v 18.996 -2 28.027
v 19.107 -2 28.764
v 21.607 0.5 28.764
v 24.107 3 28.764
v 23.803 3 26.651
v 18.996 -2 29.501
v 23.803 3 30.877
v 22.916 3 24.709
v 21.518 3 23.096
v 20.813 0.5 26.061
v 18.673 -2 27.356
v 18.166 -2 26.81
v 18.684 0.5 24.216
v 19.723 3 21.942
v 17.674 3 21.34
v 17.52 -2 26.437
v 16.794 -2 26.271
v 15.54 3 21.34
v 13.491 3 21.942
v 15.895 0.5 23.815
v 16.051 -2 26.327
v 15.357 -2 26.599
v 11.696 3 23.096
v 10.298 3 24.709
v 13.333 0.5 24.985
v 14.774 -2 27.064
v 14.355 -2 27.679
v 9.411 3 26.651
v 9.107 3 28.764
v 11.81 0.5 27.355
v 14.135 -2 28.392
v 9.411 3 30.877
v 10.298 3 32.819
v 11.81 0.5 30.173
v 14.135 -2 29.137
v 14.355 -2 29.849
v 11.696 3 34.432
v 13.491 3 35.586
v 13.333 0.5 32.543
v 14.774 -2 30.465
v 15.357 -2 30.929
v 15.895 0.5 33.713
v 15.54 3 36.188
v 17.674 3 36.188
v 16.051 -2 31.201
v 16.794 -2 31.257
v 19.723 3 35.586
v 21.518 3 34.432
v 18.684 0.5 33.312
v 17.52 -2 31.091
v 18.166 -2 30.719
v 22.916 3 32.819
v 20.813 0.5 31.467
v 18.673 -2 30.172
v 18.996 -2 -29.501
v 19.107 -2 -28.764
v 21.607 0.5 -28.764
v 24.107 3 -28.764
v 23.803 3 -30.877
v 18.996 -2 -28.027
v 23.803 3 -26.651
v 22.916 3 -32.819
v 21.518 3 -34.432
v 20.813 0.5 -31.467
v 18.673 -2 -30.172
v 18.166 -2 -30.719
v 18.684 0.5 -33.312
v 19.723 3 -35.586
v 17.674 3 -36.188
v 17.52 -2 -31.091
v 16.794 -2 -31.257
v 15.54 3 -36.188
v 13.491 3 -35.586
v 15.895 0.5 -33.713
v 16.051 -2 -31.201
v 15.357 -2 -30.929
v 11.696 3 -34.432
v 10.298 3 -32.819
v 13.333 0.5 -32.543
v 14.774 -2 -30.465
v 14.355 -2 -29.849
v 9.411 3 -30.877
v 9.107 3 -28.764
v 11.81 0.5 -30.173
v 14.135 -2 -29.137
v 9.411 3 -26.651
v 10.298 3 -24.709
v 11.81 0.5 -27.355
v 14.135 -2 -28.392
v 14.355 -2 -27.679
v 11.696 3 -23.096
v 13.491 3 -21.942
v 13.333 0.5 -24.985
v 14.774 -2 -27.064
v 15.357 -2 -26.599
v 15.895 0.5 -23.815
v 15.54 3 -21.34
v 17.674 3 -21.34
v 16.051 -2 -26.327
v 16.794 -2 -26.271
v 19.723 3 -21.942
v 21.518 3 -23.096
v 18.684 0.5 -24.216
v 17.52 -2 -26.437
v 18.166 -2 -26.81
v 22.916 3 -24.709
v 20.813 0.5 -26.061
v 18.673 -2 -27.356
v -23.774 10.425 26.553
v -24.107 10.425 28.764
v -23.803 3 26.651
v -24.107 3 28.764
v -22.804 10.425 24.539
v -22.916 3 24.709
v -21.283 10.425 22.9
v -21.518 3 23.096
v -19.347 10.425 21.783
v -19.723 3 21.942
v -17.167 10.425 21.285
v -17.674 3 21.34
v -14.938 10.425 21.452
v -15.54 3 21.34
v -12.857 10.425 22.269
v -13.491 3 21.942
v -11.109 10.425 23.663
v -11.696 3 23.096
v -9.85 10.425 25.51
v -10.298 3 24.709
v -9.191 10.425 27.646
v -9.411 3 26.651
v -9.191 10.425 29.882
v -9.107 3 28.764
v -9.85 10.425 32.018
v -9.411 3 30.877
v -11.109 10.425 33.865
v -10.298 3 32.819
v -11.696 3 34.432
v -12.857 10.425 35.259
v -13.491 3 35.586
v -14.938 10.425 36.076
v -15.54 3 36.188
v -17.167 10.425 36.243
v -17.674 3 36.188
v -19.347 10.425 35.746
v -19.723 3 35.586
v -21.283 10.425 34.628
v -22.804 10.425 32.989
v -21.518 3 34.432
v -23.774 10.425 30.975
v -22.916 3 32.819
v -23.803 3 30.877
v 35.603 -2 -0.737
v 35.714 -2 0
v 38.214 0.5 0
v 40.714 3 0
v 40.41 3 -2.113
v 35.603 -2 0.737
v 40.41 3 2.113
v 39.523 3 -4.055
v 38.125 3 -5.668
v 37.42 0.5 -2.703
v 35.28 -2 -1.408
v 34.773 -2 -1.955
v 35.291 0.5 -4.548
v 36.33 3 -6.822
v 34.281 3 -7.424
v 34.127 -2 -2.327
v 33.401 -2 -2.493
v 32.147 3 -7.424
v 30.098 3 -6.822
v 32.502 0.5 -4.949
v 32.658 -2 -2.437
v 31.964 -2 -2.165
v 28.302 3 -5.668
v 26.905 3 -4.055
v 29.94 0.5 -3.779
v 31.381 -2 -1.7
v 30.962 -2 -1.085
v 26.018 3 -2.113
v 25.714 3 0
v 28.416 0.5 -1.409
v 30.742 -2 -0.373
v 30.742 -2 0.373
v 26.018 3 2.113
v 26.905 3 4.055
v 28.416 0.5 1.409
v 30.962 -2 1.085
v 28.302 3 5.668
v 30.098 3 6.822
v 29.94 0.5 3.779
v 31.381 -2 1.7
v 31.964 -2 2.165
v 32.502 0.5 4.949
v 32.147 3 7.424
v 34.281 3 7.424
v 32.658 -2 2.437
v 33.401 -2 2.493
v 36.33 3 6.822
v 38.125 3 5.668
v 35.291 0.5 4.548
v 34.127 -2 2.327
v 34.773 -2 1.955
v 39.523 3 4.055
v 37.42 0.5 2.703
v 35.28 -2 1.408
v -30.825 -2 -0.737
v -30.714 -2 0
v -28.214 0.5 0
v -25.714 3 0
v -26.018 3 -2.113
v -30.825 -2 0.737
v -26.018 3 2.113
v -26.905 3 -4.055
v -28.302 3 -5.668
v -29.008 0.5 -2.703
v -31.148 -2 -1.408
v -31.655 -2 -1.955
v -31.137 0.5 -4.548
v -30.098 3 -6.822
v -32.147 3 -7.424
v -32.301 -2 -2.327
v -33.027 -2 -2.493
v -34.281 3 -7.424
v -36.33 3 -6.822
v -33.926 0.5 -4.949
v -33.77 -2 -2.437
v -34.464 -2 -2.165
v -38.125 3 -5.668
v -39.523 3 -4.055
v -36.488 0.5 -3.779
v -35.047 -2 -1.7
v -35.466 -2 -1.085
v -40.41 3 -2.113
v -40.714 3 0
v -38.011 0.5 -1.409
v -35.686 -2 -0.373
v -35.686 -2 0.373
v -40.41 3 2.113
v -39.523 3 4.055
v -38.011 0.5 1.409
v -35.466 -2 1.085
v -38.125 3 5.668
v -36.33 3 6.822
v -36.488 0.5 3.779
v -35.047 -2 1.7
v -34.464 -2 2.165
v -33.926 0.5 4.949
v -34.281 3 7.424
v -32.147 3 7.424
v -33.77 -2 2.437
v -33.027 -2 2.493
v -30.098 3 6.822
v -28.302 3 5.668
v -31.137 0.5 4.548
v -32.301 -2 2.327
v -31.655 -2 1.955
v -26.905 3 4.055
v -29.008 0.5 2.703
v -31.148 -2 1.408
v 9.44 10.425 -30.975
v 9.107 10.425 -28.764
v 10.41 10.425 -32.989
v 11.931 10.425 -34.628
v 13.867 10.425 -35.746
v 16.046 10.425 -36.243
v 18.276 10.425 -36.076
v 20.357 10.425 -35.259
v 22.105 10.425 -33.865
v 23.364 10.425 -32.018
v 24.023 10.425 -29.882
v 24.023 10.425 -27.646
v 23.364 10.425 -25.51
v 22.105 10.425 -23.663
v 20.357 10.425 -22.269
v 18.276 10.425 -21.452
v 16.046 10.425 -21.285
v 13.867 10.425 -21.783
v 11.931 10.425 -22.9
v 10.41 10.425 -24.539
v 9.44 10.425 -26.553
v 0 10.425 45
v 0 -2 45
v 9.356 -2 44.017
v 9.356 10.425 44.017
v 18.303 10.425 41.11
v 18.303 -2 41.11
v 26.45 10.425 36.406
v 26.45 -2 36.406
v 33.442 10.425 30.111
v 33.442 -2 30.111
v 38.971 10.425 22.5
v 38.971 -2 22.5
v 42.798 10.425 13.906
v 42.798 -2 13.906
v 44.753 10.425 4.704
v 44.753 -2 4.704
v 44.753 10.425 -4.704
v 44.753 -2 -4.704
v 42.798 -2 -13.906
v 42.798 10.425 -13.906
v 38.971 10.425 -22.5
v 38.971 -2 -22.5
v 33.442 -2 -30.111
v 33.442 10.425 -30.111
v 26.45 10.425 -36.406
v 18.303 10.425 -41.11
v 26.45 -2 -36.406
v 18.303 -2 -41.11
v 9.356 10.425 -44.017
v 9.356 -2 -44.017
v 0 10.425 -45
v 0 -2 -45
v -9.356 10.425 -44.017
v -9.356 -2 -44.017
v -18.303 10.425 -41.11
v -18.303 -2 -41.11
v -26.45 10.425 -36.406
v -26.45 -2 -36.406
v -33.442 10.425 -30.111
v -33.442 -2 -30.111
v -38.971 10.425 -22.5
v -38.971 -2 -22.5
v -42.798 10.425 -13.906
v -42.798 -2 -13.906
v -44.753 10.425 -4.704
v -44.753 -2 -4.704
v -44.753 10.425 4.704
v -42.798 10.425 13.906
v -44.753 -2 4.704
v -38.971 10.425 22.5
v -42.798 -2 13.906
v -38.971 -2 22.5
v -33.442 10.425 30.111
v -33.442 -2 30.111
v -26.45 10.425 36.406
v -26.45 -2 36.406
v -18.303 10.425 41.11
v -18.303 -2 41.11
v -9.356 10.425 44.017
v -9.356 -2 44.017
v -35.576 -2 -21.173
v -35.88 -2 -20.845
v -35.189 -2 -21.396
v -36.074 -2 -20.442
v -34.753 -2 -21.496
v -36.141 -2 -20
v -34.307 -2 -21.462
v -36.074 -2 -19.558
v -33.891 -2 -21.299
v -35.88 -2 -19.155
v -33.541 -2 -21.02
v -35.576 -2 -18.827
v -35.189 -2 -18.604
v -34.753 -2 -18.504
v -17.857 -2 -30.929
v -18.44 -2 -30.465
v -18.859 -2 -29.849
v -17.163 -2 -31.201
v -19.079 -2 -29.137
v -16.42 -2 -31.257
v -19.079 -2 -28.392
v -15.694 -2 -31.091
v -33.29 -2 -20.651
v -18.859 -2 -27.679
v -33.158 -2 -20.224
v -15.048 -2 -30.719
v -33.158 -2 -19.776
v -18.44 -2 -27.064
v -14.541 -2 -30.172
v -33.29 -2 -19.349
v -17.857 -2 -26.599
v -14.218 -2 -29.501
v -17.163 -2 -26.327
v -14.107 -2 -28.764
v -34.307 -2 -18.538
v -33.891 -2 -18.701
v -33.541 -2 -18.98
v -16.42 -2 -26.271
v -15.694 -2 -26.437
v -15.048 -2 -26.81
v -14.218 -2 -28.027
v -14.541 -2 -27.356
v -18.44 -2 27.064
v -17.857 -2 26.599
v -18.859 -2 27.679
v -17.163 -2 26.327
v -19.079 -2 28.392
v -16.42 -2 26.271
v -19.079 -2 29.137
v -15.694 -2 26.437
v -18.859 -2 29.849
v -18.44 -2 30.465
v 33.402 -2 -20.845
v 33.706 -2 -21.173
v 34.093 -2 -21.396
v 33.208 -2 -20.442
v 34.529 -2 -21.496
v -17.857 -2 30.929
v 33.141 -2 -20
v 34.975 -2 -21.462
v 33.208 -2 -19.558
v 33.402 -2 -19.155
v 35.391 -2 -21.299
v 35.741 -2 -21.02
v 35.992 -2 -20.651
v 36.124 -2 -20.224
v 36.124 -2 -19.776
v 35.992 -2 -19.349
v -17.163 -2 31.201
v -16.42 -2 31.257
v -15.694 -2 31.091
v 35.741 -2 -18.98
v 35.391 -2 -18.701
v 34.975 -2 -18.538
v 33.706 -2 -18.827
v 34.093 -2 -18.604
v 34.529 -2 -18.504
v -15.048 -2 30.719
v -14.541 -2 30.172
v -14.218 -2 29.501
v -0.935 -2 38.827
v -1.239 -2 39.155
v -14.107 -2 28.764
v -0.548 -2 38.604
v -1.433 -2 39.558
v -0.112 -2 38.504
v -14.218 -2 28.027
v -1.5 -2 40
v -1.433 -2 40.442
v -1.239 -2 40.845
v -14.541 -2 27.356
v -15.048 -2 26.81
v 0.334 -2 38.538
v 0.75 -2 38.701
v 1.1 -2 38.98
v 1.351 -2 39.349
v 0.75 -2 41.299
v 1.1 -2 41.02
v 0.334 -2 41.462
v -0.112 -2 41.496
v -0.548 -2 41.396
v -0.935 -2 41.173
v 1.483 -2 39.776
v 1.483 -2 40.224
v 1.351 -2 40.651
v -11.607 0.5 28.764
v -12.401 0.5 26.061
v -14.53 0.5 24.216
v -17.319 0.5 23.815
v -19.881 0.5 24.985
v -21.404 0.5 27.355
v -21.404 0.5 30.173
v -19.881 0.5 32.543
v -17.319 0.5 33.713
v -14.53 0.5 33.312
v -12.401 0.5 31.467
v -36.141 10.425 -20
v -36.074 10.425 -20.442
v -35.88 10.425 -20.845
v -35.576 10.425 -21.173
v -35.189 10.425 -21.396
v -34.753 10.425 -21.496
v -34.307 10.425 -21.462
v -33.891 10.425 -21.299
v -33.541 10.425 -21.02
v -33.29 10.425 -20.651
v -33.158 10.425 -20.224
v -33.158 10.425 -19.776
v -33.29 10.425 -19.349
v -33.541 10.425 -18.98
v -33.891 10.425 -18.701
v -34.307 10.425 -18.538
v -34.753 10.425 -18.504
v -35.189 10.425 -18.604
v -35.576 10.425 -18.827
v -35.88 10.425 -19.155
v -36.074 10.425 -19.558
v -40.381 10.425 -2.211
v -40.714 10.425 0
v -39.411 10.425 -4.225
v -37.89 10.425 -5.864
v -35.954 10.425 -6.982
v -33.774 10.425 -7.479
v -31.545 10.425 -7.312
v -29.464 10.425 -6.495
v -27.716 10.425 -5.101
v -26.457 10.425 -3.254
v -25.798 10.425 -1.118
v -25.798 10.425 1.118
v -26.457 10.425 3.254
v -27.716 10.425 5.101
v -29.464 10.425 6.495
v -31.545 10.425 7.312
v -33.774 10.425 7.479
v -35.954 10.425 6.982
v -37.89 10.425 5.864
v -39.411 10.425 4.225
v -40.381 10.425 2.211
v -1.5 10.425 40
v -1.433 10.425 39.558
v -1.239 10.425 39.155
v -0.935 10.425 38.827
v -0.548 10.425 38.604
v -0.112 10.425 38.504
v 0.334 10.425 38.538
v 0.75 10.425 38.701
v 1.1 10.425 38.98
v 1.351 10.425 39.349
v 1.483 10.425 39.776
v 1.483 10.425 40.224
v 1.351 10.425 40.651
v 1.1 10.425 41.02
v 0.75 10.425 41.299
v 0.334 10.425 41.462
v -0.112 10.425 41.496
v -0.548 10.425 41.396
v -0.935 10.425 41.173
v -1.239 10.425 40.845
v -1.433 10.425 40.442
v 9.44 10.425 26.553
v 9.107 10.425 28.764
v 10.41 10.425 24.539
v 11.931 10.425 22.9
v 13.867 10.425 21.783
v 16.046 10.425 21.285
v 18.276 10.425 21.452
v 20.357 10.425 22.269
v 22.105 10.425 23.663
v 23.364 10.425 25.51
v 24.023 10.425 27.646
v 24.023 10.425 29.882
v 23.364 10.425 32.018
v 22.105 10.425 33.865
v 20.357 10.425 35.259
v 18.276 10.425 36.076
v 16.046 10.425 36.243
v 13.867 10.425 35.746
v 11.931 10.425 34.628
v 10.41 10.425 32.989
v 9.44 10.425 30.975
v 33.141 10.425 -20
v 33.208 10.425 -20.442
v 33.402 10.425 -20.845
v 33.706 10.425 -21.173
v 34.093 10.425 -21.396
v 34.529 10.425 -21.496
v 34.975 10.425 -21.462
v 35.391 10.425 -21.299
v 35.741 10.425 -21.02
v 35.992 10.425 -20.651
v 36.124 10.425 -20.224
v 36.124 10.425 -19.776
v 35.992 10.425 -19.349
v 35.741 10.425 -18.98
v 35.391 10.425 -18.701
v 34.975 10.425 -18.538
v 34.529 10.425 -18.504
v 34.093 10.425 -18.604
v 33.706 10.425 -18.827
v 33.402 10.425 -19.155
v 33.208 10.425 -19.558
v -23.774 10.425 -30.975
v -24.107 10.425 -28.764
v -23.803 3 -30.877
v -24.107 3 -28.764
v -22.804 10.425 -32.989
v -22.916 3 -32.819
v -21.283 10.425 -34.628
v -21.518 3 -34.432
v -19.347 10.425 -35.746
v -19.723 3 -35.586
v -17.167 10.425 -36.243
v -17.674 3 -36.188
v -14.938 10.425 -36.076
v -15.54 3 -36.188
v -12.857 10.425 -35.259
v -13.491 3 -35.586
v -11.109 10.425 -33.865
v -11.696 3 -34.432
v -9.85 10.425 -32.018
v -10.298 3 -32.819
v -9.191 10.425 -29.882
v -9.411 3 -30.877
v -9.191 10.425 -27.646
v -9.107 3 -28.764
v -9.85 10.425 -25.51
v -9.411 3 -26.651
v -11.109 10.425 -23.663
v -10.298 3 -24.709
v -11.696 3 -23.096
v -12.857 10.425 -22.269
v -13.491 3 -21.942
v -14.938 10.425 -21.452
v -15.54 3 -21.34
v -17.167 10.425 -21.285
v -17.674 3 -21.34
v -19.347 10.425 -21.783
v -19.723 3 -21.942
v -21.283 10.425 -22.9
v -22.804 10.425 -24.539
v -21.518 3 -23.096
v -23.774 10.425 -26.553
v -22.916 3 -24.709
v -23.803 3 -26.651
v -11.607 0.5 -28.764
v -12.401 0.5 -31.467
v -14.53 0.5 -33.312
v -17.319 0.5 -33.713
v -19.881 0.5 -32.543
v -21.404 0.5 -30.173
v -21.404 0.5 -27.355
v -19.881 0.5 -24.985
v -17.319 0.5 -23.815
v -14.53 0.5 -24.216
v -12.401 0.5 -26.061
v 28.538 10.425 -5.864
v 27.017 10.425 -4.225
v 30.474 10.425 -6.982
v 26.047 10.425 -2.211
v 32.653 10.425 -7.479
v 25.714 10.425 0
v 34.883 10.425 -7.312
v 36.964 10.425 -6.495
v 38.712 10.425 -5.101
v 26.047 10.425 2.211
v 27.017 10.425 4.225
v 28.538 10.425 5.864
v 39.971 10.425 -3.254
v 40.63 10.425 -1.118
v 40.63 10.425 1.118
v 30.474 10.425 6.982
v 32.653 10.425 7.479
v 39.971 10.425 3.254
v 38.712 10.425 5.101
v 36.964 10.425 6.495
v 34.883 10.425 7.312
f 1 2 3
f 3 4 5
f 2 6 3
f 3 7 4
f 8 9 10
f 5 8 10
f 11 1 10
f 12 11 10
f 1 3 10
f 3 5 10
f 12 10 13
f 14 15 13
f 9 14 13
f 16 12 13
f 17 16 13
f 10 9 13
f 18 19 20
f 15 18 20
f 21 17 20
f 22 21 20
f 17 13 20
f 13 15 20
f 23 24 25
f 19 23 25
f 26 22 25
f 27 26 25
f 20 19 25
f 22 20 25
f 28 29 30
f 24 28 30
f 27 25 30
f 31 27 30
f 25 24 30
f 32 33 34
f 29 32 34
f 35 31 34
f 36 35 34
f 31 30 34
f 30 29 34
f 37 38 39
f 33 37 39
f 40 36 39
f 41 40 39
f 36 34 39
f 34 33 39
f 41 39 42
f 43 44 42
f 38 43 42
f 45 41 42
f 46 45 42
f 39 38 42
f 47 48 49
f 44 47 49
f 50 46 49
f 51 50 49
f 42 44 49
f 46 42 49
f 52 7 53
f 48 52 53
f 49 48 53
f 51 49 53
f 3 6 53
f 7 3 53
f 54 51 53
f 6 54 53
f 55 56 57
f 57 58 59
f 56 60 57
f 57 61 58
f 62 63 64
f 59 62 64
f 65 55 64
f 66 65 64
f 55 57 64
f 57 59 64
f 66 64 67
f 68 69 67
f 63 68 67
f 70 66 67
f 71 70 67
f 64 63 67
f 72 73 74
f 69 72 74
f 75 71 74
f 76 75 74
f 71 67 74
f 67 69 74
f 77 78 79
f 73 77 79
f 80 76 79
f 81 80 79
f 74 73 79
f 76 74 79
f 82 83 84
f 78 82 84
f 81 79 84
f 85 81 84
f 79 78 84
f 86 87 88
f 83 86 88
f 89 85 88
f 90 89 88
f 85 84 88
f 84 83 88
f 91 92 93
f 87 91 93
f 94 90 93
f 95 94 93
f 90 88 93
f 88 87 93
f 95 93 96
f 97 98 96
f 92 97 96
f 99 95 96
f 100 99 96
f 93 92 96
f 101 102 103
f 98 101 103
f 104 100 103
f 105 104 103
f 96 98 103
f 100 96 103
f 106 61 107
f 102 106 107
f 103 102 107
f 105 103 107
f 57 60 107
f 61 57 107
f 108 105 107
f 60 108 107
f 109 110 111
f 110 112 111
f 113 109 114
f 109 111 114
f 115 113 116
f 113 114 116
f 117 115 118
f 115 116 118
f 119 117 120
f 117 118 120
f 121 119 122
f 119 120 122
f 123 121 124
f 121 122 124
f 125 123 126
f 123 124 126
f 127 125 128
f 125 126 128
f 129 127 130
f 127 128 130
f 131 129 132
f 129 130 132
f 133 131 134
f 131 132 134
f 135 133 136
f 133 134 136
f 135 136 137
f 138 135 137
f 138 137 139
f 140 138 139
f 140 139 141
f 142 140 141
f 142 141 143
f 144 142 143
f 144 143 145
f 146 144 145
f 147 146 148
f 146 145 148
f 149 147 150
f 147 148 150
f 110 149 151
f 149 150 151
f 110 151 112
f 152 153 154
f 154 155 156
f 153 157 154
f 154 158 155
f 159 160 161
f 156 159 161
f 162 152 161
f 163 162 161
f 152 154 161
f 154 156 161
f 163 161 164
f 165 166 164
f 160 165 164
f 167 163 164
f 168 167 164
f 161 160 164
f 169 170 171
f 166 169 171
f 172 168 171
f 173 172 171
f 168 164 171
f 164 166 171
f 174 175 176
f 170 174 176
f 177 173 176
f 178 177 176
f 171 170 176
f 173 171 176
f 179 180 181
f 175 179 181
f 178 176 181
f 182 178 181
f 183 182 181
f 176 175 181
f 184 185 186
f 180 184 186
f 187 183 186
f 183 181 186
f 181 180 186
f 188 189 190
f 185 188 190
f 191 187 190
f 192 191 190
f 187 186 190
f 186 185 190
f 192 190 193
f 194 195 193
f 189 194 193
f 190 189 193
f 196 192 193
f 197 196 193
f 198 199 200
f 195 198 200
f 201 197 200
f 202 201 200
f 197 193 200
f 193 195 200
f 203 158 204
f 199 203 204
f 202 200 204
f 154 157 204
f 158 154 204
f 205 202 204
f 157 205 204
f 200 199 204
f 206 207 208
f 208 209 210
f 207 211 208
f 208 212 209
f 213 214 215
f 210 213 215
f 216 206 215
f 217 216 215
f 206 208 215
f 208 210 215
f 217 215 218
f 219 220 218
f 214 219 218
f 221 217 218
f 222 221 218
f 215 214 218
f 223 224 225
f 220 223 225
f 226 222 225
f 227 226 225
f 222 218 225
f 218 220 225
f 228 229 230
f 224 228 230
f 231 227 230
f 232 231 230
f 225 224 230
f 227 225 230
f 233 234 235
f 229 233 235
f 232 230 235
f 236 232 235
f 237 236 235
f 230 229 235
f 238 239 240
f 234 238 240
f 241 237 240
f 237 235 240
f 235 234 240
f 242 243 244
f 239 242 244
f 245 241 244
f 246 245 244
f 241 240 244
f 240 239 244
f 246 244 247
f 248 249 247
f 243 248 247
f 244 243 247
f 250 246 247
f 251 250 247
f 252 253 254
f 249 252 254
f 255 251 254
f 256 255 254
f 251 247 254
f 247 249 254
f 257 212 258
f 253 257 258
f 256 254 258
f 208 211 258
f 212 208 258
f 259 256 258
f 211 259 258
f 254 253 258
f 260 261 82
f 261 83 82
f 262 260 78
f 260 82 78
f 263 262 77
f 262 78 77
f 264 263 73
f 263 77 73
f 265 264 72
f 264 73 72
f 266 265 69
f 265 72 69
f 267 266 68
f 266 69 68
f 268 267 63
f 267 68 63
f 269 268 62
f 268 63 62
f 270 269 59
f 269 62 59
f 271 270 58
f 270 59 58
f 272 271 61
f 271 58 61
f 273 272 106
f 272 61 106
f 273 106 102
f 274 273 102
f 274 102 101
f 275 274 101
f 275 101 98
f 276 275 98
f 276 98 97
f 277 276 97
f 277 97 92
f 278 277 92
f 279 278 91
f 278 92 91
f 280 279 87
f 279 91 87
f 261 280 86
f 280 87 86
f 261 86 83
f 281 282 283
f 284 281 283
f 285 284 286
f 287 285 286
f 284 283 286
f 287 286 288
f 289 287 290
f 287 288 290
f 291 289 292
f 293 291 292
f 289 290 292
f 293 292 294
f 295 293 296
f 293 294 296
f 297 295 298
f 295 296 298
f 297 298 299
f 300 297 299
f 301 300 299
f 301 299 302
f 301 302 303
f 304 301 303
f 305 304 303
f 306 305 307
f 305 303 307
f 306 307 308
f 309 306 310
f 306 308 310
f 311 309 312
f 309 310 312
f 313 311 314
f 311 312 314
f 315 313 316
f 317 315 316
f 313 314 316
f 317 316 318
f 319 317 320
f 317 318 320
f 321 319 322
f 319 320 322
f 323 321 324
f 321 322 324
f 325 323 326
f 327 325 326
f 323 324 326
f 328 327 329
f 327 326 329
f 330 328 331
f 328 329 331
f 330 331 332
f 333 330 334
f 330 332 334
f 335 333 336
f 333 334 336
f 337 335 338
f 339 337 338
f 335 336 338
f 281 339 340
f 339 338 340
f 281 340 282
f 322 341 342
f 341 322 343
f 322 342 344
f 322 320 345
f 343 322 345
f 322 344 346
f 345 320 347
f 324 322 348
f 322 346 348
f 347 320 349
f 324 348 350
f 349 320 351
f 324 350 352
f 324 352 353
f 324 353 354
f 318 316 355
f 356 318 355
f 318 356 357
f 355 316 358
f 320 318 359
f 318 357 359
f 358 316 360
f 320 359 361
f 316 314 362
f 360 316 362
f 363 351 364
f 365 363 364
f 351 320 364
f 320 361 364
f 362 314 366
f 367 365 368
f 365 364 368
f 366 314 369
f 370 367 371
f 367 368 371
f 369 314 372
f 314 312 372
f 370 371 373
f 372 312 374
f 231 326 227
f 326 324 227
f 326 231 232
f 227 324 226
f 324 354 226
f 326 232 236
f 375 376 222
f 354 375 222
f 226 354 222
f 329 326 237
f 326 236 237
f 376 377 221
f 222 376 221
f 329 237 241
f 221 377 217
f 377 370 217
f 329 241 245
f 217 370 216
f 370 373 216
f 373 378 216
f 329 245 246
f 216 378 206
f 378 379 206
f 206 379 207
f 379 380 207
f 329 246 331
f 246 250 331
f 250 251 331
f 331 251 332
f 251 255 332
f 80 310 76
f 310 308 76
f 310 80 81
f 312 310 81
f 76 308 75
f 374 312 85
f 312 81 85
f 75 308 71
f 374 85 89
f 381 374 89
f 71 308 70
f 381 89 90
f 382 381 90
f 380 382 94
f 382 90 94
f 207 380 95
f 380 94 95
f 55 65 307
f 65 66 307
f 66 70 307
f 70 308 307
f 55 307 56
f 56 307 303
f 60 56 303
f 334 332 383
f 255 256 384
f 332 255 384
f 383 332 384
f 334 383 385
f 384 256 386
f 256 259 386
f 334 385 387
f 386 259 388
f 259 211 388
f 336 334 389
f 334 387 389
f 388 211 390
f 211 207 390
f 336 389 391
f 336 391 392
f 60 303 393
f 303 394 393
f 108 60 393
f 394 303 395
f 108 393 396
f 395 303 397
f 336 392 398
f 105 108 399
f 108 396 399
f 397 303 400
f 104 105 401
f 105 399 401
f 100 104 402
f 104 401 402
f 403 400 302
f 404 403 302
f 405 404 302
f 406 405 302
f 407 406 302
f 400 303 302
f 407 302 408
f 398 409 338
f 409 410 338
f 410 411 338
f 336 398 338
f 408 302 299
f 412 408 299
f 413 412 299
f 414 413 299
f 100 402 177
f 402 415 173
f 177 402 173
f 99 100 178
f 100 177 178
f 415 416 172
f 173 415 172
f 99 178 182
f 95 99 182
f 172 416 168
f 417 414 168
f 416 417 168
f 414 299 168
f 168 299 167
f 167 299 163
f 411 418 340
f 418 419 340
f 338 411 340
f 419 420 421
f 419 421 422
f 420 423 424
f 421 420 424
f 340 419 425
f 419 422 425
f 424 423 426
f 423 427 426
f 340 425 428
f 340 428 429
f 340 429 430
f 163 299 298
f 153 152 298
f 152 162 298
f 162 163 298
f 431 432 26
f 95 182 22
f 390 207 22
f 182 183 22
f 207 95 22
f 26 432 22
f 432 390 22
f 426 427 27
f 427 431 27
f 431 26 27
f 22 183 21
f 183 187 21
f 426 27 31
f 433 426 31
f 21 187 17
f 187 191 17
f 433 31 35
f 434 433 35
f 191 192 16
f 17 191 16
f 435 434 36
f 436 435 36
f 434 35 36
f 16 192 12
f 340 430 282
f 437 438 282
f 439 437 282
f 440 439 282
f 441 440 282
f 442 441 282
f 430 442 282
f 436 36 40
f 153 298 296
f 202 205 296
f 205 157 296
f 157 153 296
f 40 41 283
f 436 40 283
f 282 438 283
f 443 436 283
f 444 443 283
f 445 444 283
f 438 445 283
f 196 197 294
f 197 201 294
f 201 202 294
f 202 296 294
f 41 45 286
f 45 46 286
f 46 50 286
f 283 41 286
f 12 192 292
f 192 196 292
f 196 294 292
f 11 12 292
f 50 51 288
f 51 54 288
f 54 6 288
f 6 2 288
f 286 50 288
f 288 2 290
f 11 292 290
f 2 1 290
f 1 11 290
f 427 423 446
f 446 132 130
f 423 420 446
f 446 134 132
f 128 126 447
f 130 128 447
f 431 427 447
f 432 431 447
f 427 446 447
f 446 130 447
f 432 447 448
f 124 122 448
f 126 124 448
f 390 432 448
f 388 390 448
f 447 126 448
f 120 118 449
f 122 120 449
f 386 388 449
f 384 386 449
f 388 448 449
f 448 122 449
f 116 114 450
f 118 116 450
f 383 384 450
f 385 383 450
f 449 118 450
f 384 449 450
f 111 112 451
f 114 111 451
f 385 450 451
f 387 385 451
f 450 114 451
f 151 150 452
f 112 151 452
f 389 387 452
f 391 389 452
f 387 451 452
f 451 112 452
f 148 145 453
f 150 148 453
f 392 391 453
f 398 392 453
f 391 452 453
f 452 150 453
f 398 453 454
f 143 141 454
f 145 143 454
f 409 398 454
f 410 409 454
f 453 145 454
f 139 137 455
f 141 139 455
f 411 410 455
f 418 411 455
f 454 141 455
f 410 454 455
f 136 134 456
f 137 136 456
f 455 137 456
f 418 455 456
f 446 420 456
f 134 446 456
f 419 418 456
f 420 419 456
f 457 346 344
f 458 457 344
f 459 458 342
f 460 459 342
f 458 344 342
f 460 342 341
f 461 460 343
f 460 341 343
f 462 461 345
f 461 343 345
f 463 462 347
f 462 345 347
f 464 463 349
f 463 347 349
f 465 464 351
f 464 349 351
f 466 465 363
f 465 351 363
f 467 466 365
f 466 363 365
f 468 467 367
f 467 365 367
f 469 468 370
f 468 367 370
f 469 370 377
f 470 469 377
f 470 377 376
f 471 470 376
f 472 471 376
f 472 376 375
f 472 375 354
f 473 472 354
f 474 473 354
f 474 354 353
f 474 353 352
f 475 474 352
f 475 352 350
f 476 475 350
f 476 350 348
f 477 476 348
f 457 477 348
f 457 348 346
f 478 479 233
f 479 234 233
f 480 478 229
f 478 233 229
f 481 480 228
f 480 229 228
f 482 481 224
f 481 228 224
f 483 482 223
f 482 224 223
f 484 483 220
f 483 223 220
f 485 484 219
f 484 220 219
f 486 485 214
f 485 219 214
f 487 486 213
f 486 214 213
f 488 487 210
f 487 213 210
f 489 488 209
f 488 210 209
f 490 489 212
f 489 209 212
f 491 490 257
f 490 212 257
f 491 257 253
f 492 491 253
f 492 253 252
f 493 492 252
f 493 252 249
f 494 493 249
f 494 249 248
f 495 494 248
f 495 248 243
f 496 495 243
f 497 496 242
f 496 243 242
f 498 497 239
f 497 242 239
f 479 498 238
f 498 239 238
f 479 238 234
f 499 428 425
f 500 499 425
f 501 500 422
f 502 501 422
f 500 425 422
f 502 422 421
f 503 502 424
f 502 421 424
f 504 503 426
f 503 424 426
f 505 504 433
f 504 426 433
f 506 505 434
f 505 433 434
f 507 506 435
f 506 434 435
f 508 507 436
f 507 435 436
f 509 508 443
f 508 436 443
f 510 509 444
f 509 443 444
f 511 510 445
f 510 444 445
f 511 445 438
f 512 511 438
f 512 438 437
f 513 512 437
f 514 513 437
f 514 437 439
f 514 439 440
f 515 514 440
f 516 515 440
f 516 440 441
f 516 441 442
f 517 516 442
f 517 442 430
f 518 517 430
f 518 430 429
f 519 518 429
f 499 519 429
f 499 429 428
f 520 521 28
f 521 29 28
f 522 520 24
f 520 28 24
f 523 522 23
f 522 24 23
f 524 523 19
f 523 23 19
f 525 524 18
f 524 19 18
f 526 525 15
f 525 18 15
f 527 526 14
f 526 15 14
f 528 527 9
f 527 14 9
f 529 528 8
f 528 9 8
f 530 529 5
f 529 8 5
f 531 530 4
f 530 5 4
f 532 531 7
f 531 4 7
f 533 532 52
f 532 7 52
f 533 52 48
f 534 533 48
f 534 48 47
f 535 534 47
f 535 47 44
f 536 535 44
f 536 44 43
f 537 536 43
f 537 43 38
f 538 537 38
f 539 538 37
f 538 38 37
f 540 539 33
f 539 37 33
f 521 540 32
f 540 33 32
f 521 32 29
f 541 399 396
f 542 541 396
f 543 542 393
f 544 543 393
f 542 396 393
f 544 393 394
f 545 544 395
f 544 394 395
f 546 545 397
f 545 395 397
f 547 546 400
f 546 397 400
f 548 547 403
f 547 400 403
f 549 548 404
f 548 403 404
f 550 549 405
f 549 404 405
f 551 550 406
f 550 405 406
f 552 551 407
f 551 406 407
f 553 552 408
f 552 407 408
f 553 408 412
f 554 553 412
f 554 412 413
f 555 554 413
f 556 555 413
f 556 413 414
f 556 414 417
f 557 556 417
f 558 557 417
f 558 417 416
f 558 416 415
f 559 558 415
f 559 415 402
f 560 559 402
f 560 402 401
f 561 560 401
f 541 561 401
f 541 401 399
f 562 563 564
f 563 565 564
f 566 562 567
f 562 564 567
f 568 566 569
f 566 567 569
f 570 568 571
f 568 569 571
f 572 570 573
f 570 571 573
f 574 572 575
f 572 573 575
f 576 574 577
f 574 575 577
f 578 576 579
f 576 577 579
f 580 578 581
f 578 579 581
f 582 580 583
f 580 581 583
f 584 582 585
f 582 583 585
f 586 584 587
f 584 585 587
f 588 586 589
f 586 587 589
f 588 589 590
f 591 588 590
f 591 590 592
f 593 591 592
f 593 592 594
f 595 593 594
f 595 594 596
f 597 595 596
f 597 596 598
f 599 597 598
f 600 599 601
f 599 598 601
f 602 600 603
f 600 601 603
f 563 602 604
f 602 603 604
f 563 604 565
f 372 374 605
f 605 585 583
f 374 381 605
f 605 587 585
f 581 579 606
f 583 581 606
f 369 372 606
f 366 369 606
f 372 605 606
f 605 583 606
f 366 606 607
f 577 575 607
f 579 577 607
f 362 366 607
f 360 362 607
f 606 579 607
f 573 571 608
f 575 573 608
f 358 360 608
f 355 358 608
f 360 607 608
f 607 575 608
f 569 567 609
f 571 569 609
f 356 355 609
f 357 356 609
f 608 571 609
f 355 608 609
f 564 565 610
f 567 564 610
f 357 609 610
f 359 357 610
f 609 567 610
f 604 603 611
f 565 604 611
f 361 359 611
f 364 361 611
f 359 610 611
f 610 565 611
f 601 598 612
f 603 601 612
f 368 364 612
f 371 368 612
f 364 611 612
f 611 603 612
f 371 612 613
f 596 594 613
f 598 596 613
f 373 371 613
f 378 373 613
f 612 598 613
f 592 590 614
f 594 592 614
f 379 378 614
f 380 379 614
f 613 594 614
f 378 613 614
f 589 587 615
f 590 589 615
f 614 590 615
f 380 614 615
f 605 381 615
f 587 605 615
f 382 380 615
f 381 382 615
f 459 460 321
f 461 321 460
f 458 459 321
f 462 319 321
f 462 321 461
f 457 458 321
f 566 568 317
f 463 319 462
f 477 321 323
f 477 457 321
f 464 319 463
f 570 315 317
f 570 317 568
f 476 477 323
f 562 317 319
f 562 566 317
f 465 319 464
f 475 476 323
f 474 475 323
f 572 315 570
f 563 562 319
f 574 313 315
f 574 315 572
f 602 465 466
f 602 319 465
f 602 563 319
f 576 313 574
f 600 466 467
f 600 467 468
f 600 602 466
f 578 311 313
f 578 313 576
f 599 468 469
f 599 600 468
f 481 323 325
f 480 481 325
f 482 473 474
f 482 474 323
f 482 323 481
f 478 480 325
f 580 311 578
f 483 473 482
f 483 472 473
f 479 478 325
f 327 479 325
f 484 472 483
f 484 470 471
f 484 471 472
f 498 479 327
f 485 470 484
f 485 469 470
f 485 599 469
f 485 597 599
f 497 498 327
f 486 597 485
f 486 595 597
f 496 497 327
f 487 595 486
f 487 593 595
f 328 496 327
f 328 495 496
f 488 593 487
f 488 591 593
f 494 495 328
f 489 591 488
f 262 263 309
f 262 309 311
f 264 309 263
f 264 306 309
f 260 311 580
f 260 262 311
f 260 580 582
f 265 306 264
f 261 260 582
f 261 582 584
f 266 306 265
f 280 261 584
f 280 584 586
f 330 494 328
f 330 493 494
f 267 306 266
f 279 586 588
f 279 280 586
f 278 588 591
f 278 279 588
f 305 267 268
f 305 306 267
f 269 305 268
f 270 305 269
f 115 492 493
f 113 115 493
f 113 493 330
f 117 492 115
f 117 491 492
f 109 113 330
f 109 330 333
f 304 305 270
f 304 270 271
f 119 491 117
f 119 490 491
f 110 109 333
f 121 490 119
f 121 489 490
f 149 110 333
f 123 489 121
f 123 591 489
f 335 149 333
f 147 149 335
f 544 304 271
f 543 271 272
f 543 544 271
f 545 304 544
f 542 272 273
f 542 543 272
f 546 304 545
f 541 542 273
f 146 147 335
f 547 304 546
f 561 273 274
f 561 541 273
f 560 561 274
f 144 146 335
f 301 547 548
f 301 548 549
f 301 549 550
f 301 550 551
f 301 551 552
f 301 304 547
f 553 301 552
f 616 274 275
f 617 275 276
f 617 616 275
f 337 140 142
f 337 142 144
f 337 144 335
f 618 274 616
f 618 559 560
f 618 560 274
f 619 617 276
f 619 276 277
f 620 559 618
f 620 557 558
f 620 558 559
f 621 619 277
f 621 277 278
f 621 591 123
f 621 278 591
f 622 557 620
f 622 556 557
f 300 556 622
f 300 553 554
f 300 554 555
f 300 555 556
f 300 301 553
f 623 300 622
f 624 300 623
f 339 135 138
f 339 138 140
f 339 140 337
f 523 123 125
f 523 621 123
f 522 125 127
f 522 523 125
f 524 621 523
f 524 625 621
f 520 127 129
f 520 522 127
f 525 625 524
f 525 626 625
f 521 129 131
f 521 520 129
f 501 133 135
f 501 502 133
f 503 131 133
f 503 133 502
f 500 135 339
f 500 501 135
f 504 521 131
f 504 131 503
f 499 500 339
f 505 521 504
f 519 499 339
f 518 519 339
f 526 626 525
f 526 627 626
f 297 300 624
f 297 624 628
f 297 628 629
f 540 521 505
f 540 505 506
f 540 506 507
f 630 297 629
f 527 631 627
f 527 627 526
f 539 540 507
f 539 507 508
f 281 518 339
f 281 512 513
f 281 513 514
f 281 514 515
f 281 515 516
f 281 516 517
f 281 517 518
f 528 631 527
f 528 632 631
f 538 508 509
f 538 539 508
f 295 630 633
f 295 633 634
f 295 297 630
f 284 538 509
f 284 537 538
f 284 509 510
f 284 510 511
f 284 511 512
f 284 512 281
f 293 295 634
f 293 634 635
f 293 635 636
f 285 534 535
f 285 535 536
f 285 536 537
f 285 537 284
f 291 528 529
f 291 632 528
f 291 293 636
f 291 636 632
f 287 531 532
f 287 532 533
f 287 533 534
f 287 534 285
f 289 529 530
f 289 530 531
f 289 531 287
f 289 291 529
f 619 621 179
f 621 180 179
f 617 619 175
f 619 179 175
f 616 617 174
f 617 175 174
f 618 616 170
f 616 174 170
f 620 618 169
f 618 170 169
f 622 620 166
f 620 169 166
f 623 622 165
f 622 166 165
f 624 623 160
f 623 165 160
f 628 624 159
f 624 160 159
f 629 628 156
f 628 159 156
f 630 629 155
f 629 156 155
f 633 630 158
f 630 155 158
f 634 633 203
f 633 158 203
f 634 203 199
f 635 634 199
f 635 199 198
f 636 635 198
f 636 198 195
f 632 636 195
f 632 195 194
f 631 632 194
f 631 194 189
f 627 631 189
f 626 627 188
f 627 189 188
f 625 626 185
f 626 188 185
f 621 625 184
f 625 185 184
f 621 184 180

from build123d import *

# Parameters (mm, degrees)
BOSS_EXTRUDE1_DEPTH       = 10.425440853
BOSS_EXTRUDE1_DEPTH_BACK  = 2
SKETCH1_R                 = 45
F_8_0MM_DOWEL_HOLE1_D     = 15
F_8_0MM_DOWEL_HOLE1_DEPTH = 7.425440853
F_8_0MM_DOWEL_HOLE1_TIP   = 7.5
F_3_0_3_DIAMETER_HOLE1_D  = 3


with BuildPart() as part:
    # Sketch1 → Boss-Extrude1 (new, two sides: drawn at the far end of the back side and taken through both)
    with BuildSketch(Plane(origin=(0, 0, 0), x_dir=(1, 0, 0), z_dir=(0, 1, 0)).offset(-BOSS_EXTRUDE1_DEPTH_BACK)):
        with Locations(Location((0, 0, 0), (0, 0, 270))):
            Circle(SKETCH1_R)
    extrude(amount=BOSS_EXTRUDE1_DEPTH + BOSS_EXTRUDE1_DEPTH_BACK)

    # Ø8.0mm Dowel Hole1
    with Locations(Plane(origin=(0, 10.425440853, 0), x_dir=(1, 0, 0), z_dir=(0, 1, 0))):
        with Locations((-16.606971943, 28.764119165), (-16.606971943, -28.764119165), (33.213943886, 0), (16.606971943, 28.764119165), (16.606971943, -28.764119165), (-33.213943886, 0)):
            Hole(F_8_0MM_DOWEL_HOLE1_D / 2, depth=F_8_0MM_DOWEL_HOLE1_DEPTH)
            with Locations((0, 0, -(F_8_0MM_DOWEL_HOLE1_DEPTH + F_8_0MM_DOWEL_HOLE1_TIP / 2))):  # 90° drill point
                Cone(0, F_8_0MM_DOWEL_HOLE1_D / 2, F_8_0MM_DOWEL_HOLE1_TIP, mode=Mode.SUBTRACT)

    # Ø3.0 (3) Diameter Hole1 (through all)
    with Locations(Plane(origin=(0, 10.425440853, 0), x_dir=(1, 0, 0), z_dir=(0, 1, 0))):
        with Locations((-34.641016151, 20), (0, -40), (34.641016151, 20)):
            Hole(F_3_0_3_DIAMETER_HOLE1_D / 2)


solid = part.part
